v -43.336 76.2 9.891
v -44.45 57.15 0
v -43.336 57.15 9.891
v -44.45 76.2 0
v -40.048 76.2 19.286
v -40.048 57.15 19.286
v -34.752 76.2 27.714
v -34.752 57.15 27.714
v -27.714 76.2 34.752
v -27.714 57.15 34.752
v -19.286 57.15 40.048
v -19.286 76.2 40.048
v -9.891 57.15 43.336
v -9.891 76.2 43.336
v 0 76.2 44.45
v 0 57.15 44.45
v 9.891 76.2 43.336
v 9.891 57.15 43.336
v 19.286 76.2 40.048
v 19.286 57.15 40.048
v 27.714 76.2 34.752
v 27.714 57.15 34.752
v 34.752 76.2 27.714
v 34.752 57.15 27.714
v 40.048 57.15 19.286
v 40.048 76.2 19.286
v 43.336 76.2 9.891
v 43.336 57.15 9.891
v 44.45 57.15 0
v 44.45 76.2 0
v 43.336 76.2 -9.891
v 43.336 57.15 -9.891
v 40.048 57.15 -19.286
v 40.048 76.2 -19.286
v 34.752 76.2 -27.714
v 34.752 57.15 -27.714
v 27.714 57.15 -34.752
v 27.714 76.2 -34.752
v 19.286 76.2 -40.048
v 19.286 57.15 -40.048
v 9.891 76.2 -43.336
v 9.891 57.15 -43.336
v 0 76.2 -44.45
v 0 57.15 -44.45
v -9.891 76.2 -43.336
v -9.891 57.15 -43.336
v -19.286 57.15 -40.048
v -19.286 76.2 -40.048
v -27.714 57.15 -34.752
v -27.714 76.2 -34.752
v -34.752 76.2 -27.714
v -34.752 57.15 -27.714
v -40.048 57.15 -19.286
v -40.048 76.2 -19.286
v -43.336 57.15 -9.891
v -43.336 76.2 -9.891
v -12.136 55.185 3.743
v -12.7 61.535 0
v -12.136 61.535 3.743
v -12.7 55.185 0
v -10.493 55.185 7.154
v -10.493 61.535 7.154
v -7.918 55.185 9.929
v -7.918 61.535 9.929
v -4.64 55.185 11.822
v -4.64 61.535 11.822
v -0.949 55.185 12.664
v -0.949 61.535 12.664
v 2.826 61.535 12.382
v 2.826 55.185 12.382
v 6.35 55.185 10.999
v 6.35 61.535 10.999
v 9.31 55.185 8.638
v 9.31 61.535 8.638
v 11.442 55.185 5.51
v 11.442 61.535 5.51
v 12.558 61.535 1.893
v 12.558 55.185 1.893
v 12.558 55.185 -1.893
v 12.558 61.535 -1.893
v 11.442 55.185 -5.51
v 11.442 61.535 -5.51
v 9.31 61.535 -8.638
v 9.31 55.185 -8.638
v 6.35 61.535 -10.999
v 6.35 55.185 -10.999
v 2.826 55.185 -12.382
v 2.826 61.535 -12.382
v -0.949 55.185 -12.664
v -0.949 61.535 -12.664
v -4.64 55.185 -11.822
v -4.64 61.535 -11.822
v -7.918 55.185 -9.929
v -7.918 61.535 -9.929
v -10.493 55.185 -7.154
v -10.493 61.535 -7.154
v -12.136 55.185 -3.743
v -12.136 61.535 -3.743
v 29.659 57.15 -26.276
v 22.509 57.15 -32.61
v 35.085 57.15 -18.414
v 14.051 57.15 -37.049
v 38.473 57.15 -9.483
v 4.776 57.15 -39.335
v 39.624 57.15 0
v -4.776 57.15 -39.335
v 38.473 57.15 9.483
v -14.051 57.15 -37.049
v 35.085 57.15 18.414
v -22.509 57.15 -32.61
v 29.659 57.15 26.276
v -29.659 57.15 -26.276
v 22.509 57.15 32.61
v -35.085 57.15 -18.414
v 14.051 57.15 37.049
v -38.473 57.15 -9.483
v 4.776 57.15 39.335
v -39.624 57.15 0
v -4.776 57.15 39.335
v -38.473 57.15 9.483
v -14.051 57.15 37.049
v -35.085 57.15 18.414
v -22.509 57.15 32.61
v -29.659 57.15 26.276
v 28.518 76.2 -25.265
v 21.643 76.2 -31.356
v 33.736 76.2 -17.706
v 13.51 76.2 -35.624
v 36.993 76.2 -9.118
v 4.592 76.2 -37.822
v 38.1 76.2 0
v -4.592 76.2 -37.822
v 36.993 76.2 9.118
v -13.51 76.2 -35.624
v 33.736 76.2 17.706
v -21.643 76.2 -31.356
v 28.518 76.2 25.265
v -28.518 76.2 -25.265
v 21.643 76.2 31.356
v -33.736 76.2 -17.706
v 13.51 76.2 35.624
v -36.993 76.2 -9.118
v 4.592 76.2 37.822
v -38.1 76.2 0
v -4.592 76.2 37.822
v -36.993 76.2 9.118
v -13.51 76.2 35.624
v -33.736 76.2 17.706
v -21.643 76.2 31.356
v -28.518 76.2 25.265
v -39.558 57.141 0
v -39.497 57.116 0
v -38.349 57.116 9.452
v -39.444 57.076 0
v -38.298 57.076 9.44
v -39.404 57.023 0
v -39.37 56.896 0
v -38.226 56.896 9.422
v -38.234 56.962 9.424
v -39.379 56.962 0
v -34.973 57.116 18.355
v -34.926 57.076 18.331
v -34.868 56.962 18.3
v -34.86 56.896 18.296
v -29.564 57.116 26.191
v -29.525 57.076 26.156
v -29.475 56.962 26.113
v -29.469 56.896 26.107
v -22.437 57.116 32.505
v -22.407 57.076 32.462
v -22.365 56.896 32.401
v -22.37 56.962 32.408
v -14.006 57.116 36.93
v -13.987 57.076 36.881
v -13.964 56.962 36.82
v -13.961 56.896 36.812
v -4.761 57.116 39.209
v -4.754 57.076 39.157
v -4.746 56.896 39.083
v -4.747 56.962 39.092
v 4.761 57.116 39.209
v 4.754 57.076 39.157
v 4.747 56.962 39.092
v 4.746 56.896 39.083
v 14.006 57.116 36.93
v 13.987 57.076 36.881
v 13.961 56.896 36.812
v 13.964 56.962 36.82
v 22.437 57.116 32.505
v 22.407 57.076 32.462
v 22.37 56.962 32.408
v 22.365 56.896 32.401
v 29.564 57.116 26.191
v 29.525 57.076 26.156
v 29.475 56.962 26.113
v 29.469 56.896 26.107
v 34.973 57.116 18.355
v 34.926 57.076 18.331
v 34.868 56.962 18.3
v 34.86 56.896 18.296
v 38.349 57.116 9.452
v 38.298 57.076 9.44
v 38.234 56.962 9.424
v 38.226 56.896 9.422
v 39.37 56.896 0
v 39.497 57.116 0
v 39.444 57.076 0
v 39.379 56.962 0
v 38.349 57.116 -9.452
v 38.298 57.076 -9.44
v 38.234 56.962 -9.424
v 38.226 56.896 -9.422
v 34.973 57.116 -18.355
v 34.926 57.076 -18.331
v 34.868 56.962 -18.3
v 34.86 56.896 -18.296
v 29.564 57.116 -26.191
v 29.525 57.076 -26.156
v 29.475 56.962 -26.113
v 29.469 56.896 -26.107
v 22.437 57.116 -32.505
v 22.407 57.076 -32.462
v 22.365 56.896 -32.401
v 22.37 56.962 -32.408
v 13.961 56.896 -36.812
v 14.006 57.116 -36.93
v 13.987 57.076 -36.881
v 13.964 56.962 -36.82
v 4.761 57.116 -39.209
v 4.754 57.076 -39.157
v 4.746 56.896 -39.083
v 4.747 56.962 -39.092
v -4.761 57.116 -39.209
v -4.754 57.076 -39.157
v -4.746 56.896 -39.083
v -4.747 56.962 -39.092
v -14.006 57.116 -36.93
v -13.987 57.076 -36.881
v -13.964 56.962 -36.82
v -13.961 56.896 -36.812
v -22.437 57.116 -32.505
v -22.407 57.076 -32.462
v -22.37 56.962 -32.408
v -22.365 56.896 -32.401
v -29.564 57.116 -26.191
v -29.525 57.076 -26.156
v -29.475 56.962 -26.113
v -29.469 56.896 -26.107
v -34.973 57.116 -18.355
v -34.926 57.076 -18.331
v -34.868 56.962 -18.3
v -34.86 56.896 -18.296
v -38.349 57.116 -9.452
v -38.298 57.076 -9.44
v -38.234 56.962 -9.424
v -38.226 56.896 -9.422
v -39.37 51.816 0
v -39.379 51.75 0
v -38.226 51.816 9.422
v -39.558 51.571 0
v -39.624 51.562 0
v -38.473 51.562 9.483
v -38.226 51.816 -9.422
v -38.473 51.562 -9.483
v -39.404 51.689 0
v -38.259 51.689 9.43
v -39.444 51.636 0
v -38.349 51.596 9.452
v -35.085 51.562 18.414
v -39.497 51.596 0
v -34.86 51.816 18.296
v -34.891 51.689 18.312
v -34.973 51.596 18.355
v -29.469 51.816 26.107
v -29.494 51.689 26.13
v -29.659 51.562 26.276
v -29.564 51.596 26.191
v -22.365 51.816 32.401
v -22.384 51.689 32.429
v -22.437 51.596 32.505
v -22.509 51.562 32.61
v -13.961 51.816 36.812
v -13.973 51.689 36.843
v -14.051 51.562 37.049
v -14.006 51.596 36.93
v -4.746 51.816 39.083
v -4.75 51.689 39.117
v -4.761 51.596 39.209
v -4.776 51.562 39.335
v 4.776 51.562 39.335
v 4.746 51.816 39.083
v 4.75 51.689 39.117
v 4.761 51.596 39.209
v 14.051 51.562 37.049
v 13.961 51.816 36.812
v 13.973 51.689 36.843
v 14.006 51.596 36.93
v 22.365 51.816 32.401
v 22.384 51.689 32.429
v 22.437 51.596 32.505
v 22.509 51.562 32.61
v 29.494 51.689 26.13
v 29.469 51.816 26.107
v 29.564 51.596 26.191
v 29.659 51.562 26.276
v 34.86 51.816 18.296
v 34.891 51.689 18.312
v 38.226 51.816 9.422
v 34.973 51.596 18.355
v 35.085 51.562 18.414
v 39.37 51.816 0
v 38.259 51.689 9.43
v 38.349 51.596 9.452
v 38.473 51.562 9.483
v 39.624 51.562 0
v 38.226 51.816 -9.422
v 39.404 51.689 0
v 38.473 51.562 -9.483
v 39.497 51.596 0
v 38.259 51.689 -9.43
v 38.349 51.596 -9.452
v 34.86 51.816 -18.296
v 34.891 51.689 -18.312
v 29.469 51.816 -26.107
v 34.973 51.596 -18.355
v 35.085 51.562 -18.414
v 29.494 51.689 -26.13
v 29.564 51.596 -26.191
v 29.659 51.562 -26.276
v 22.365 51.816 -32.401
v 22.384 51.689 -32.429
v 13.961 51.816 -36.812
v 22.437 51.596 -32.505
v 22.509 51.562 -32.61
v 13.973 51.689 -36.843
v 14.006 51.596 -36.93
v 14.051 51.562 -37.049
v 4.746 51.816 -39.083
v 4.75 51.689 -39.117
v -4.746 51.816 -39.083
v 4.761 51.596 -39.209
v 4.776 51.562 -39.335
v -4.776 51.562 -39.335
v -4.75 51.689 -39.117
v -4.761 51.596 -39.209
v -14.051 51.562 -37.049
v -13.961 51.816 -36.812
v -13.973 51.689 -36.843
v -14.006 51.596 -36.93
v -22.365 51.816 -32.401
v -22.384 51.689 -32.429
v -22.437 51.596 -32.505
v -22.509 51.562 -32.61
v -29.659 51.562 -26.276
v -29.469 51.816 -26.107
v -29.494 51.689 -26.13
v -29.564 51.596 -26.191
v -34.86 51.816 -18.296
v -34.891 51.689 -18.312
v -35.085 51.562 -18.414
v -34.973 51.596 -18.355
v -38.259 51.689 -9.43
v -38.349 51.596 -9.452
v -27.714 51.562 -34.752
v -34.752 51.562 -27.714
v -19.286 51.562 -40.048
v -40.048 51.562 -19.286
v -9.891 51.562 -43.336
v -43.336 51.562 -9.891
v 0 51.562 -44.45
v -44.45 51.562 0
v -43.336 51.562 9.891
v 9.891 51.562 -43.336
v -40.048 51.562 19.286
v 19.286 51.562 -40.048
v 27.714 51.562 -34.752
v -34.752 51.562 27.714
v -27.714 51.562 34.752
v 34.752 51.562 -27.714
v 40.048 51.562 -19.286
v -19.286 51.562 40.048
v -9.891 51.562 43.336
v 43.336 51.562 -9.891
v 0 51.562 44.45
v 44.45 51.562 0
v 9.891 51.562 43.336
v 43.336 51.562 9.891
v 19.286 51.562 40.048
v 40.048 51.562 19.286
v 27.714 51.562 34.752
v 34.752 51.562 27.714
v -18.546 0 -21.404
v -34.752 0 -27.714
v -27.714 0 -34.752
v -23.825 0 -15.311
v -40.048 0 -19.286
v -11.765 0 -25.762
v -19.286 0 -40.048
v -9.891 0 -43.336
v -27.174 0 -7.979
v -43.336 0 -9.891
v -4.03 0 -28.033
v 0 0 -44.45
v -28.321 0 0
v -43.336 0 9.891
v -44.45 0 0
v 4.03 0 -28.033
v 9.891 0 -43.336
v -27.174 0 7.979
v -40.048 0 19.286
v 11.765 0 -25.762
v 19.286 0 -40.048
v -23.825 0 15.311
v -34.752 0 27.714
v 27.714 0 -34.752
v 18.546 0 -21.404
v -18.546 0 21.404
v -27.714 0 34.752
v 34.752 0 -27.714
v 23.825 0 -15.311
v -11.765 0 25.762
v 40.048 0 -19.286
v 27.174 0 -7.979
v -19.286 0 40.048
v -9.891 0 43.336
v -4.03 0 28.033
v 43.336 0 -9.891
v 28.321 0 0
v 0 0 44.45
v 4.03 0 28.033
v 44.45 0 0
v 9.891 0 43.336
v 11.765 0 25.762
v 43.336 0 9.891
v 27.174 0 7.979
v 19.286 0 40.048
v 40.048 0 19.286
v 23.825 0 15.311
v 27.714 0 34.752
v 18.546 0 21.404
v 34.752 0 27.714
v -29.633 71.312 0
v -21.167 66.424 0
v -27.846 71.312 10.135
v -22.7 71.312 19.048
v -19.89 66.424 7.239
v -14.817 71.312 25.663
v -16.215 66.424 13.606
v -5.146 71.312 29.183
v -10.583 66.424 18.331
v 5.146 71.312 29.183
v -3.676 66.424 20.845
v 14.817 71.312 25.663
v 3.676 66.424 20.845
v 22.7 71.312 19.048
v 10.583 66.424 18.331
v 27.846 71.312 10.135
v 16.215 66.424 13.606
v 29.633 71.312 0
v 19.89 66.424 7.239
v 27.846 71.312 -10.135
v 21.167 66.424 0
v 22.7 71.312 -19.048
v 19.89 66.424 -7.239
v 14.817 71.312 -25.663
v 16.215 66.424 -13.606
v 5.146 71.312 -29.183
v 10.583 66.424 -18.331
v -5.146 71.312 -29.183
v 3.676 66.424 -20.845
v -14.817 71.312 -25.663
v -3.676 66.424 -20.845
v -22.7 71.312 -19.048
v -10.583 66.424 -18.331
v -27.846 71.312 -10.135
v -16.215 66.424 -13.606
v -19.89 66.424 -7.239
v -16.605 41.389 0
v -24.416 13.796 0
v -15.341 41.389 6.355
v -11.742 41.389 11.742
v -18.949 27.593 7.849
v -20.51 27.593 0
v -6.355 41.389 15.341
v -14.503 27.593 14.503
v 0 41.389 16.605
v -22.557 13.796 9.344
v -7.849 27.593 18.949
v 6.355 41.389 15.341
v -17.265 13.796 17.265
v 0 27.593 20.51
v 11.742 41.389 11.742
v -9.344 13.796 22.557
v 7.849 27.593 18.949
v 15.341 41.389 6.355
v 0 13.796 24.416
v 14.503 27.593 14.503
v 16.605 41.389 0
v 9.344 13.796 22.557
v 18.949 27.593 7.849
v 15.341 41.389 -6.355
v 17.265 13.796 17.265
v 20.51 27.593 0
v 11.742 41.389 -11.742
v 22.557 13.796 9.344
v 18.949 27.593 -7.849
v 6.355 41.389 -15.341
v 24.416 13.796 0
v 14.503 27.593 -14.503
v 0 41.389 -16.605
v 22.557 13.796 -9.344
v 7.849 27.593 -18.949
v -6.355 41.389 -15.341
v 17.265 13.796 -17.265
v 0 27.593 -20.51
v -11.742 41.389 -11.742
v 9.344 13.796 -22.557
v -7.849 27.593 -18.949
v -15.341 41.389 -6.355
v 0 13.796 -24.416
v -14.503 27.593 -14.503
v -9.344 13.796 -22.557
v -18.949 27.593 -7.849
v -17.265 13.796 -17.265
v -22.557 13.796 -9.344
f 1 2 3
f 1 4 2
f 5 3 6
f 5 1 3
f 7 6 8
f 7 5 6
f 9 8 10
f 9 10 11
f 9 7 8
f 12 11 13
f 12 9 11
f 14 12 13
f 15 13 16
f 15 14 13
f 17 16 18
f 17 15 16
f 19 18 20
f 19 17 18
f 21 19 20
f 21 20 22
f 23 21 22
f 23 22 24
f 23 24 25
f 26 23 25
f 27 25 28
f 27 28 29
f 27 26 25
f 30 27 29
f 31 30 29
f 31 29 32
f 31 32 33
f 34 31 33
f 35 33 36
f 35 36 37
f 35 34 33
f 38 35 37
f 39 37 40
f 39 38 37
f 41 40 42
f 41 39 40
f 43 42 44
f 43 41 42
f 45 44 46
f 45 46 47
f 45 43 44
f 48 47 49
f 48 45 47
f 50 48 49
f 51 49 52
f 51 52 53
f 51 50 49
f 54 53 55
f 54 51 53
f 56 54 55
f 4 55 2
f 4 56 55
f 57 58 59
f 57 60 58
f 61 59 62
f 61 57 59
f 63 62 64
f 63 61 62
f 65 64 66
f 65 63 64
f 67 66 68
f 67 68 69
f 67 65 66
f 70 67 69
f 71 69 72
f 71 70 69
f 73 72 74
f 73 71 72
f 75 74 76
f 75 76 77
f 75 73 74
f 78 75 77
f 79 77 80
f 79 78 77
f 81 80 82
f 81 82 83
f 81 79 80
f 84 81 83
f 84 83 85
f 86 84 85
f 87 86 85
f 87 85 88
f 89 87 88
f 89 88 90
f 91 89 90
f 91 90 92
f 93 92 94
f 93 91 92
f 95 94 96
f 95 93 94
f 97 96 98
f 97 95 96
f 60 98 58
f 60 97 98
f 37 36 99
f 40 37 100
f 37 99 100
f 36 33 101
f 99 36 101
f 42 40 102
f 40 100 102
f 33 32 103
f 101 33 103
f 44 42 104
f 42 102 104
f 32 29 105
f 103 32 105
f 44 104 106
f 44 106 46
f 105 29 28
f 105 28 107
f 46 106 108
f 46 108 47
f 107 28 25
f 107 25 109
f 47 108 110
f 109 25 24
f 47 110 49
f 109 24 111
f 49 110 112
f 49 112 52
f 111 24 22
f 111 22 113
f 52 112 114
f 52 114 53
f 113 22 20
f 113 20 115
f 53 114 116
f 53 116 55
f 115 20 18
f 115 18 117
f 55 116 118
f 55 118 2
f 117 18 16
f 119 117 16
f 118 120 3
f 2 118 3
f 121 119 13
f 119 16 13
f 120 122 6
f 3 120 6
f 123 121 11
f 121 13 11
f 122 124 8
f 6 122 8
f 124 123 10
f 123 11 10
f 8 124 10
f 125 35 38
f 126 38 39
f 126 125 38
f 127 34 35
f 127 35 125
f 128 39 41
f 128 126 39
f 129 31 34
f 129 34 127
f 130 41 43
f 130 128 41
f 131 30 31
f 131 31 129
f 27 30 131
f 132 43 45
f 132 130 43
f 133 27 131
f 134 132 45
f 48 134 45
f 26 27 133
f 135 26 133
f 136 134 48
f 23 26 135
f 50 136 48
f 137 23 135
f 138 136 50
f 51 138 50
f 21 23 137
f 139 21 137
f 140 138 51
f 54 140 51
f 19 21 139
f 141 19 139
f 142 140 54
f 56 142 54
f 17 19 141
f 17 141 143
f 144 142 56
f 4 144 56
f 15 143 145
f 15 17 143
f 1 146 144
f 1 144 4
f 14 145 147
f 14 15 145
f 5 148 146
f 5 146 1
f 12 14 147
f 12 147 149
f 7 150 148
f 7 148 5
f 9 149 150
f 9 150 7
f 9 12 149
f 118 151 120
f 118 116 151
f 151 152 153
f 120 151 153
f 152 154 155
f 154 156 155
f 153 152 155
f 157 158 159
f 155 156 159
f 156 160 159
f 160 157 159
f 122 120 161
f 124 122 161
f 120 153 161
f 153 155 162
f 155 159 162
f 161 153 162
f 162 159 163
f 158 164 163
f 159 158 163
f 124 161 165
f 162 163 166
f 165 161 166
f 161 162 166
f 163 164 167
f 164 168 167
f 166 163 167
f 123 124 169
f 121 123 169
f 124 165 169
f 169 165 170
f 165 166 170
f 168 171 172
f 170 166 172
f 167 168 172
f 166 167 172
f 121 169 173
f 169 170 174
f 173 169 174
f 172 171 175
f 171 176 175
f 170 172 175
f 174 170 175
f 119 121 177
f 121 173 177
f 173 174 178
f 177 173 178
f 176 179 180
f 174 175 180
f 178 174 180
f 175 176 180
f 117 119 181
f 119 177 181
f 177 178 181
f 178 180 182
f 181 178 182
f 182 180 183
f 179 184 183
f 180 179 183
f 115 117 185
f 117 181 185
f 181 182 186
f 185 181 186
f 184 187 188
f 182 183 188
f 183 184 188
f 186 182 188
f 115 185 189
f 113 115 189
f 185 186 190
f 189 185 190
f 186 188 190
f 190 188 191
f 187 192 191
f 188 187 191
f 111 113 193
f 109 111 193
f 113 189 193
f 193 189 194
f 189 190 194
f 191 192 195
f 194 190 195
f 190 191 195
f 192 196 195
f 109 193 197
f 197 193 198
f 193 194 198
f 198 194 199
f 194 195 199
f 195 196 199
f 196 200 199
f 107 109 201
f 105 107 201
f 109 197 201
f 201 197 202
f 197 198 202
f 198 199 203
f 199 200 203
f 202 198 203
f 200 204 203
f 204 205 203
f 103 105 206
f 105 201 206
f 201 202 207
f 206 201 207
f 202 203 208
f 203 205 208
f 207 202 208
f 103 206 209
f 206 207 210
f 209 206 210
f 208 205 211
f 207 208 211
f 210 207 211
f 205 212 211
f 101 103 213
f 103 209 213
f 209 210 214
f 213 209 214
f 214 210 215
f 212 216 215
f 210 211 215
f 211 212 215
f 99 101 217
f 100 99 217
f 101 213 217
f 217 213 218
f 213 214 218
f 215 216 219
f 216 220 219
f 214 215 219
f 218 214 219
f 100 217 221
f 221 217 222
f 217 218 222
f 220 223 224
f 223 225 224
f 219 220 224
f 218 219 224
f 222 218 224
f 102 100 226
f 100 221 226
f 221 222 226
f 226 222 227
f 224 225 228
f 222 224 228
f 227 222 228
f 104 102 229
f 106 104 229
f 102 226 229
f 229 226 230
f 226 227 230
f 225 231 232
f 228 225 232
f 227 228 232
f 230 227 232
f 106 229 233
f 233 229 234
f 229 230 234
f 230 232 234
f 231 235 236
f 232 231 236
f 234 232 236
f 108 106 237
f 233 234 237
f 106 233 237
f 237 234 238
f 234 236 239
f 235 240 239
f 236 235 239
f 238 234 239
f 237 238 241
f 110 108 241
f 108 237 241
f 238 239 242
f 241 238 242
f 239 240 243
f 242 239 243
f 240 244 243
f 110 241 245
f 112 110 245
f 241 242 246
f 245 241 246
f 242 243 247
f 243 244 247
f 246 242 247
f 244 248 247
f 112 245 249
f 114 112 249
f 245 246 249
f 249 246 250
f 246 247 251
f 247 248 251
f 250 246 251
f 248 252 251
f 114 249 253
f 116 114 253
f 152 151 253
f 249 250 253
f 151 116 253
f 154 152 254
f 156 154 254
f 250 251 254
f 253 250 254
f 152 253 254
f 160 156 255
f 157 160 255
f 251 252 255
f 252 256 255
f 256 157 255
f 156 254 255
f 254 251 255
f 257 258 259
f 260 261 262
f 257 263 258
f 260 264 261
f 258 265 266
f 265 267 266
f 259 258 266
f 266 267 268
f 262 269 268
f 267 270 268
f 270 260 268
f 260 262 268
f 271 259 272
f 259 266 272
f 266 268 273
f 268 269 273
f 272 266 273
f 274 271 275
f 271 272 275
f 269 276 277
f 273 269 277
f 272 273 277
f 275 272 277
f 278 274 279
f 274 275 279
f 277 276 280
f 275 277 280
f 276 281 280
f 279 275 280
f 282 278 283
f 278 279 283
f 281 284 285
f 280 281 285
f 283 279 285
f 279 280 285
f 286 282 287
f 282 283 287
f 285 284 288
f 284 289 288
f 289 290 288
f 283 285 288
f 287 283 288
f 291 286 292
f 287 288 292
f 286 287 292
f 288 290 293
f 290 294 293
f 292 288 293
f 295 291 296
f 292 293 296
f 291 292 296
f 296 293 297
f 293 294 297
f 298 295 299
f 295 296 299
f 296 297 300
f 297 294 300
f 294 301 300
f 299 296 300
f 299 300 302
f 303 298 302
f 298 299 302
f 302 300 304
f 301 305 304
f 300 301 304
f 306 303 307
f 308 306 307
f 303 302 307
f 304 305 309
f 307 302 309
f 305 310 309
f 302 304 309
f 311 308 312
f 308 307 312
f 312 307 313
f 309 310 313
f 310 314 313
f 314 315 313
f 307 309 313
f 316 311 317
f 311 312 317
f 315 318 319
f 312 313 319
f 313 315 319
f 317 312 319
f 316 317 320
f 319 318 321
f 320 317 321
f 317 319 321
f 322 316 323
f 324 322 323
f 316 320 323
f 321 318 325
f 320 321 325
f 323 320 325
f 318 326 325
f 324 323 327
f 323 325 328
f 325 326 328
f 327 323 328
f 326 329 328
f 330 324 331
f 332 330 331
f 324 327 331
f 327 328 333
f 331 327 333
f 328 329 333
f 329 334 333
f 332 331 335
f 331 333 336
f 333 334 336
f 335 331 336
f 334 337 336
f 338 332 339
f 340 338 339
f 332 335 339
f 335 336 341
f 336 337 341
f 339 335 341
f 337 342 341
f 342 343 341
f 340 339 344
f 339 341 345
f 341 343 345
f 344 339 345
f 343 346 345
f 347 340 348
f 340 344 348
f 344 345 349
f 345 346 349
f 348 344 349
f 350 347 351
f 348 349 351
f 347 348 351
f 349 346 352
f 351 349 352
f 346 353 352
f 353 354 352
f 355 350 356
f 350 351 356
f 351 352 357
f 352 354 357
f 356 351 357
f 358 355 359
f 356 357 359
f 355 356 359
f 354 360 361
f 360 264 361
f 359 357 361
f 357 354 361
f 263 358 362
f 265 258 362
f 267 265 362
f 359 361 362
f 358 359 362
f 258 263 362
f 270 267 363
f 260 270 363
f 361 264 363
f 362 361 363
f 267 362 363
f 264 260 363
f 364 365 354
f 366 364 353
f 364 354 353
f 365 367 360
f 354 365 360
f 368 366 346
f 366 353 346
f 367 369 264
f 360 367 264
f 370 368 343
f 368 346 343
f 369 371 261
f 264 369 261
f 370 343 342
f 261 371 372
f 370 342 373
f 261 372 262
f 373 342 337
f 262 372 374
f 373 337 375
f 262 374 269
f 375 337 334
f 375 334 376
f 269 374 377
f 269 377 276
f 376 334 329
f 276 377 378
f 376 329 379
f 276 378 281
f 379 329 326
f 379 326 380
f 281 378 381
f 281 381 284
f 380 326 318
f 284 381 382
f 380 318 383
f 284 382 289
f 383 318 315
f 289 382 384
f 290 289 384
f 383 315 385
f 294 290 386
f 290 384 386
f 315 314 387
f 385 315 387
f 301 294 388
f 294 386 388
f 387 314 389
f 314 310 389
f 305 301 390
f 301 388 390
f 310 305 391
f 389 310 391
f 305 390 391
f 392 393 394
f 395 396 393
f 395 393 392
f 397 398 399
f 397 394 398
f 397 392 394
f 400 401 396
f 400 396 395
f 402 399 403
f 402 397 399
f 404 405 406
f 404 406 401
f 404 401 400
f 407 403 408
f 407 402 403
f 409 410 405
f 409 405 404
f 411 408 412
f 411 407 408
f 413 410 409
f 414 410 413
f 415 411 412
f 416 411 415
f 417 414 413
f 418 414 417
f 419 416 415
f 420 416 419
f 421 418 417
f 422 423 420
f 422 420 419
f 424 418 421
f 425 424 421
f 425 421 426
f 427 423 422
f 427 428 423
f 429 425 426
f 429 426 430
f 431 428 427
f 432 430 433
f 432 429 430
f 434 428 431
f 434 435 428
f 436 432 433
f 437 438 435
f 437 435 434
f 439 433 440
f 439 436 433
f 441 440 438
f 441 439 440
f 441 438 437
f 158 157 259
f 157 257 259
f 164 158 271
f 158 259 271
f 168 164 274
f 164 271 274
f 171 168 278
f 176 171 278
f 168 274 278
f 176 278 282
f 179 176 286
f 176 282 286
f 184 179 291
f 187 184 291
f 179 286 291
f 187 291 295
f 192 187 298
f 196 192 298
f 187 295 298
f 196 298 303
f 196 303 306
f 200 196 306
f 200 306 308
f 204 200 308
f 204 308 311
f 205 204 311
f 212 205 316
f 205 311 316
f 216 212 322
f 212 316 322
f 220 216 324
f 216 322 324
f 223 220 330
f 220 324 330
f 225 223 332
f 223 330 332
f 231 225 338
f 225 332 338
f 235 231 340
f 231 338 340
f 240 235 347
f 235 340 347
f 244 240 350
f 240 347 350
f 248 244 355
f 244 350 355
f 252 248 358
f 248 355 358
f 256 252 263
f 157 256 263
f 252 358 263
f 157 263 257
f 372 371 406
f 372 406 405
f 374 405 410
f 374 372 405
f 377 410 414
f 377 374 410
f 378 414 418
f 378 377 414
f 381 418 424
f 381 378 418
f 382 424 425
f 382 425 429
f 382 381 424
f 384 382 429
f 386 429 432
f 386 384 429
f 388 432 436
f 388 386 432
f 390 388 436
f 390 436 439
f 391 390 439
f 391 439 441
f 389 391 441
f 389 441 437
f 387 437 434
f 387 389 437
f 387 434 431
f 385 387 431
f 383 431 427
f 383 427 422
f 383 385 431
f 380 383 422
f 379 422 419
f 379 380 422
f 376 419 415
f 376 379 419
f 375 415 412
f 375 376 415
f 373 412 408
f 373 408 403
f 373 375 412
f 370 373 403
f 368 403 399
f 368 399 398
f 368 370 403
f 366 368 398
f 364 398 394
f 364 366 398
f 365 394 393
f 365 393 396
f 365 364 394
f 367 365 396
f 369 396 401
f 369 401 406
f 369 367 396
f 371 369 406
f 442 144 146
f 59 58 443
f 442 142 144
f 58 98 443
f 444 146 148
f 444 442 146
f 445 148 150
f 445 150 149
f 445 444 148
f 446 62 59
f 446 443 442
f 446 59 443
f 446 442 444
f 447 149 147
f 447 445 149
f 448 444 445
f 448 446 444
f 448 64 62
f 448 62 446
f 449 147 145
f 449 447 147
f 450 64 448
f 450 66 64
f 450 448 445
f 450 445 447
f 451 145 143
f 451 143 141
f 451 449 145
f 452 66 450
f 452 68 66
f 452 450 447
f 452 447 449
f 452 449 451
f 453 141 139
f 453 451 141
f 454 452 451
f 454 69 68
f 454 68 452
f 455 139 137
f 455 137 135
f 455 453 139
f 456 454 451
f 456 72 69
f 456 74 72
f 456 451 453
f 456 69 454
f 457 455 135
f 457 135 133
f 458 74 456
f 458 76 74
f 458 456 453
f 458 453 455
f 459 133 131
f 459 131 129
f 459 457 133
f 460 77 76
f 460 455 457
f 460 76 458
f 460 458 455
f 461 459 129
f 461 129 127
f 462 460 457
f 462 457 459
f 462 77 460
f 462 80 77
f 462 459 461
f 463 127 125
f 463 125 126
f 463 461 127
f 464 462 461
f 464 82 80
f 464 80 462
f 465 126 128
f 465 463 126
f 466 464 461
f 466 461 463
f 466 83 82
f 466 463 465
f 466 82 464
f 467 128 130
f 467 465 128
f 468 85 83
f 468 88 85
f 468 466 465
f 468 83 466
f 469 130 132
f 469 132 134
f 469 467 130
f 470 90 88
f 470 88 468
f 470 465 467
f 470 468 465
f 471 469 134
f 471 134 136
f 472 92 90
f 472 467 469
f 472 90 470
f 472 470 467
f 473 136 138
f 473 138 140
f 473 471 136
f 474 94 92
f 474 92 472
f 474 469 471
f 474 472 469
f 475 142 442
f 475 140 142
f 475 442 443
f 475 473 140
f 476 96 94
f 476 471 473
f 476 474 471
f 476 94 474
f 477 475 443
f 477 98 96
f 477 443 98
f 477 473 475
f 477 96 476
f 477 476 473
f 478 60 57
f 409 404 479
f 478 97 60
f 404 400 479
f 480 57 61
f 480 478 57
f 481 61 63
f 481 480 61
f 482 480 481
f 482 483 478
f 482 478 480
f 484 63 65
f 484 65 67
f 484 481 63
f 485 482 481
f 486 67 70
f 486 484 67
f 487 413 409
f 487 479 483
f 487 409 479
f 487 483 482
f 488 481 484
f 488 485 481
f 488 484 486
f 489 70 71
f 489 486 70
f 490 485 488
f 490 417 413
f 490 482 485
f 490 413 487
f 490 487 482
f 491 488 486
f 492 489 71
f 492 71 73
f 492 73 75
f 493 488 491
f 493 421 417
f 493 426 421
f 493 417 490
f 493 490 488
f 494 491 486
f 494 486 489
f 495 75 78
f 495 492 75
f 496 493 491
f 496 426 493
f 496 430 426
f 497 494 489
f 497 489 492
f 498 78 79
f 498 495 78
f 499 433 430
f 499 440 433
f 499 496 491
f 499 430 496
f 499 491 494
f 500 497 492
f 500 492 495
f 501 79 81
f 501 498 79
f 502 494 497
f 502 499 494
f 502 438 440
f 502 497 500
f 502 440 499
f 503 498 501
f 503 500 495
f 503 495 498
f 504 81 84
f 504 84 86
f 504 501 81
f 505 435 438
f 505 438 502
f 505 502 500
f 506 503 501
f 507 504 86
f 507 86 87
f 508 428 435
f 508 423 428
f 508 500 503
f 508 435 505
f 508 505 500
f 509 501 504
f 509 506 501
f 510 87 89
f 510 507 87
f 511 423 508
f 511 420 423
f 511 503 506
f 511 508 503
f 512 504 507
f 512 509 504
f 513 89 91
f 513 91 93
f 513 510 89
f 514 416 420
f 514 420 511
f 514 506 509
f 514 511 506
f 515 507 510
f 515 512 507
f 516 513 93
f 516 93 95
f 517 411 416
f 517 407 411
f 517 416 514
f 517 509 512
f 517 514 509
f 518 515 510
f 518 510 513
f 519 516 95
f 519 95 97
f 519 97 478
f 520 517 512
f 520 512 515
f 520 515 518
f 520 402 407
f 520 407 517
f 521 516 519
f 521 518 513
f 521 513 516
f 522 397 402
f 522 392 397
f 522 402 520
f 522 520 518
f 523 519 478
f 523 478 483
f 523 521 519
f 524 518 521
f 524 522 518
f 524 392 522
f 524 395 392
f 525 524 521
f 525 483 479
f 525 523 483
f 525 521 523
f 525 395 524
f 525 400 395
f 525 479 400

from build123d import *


with BuildPart() as part:
    # Sketch1 → Revolve1 (revolve)
    with BuildSketch(Plane.XY):
        Polygon((-44.45, 0), (-44.45, 76.2), (-38.1, 76.2), (-12.7, 61.535303163), (-12.7, 55.185303163), (-28.321, 0), align=None)
    revolve(axis=Axis((0, 0, 0), (0, 1, 0)))

    # Sketch2 → Cut-Revolve1 (revolve, cut)
    with BuildSketch(Plane.XY):
        with BuildLine():
            Line((-44.45, 57.15), (-39.624, 57.15))
            ThreePointArc((-39.624, 57.15), (-39.444394878, 57.075605122), (-39.37, 56.896))
            Line((-39.37, 56.896), (-39.37, 51.816))
            ThreePointArc((-39.37, 51.816), (-39.444394878, 51.636394878), (-39.624, 51.562))
            Line((-39.624, 51.562), (-44.45, 51.562))
            Line((-44.45, 51.562), (-44.45, 57.15))
        make_face()
    revolve(axis=Axis((0, 0, 0), (0, 1, 0)), mode=Mode.SUBTRACT)


solid = part.part
